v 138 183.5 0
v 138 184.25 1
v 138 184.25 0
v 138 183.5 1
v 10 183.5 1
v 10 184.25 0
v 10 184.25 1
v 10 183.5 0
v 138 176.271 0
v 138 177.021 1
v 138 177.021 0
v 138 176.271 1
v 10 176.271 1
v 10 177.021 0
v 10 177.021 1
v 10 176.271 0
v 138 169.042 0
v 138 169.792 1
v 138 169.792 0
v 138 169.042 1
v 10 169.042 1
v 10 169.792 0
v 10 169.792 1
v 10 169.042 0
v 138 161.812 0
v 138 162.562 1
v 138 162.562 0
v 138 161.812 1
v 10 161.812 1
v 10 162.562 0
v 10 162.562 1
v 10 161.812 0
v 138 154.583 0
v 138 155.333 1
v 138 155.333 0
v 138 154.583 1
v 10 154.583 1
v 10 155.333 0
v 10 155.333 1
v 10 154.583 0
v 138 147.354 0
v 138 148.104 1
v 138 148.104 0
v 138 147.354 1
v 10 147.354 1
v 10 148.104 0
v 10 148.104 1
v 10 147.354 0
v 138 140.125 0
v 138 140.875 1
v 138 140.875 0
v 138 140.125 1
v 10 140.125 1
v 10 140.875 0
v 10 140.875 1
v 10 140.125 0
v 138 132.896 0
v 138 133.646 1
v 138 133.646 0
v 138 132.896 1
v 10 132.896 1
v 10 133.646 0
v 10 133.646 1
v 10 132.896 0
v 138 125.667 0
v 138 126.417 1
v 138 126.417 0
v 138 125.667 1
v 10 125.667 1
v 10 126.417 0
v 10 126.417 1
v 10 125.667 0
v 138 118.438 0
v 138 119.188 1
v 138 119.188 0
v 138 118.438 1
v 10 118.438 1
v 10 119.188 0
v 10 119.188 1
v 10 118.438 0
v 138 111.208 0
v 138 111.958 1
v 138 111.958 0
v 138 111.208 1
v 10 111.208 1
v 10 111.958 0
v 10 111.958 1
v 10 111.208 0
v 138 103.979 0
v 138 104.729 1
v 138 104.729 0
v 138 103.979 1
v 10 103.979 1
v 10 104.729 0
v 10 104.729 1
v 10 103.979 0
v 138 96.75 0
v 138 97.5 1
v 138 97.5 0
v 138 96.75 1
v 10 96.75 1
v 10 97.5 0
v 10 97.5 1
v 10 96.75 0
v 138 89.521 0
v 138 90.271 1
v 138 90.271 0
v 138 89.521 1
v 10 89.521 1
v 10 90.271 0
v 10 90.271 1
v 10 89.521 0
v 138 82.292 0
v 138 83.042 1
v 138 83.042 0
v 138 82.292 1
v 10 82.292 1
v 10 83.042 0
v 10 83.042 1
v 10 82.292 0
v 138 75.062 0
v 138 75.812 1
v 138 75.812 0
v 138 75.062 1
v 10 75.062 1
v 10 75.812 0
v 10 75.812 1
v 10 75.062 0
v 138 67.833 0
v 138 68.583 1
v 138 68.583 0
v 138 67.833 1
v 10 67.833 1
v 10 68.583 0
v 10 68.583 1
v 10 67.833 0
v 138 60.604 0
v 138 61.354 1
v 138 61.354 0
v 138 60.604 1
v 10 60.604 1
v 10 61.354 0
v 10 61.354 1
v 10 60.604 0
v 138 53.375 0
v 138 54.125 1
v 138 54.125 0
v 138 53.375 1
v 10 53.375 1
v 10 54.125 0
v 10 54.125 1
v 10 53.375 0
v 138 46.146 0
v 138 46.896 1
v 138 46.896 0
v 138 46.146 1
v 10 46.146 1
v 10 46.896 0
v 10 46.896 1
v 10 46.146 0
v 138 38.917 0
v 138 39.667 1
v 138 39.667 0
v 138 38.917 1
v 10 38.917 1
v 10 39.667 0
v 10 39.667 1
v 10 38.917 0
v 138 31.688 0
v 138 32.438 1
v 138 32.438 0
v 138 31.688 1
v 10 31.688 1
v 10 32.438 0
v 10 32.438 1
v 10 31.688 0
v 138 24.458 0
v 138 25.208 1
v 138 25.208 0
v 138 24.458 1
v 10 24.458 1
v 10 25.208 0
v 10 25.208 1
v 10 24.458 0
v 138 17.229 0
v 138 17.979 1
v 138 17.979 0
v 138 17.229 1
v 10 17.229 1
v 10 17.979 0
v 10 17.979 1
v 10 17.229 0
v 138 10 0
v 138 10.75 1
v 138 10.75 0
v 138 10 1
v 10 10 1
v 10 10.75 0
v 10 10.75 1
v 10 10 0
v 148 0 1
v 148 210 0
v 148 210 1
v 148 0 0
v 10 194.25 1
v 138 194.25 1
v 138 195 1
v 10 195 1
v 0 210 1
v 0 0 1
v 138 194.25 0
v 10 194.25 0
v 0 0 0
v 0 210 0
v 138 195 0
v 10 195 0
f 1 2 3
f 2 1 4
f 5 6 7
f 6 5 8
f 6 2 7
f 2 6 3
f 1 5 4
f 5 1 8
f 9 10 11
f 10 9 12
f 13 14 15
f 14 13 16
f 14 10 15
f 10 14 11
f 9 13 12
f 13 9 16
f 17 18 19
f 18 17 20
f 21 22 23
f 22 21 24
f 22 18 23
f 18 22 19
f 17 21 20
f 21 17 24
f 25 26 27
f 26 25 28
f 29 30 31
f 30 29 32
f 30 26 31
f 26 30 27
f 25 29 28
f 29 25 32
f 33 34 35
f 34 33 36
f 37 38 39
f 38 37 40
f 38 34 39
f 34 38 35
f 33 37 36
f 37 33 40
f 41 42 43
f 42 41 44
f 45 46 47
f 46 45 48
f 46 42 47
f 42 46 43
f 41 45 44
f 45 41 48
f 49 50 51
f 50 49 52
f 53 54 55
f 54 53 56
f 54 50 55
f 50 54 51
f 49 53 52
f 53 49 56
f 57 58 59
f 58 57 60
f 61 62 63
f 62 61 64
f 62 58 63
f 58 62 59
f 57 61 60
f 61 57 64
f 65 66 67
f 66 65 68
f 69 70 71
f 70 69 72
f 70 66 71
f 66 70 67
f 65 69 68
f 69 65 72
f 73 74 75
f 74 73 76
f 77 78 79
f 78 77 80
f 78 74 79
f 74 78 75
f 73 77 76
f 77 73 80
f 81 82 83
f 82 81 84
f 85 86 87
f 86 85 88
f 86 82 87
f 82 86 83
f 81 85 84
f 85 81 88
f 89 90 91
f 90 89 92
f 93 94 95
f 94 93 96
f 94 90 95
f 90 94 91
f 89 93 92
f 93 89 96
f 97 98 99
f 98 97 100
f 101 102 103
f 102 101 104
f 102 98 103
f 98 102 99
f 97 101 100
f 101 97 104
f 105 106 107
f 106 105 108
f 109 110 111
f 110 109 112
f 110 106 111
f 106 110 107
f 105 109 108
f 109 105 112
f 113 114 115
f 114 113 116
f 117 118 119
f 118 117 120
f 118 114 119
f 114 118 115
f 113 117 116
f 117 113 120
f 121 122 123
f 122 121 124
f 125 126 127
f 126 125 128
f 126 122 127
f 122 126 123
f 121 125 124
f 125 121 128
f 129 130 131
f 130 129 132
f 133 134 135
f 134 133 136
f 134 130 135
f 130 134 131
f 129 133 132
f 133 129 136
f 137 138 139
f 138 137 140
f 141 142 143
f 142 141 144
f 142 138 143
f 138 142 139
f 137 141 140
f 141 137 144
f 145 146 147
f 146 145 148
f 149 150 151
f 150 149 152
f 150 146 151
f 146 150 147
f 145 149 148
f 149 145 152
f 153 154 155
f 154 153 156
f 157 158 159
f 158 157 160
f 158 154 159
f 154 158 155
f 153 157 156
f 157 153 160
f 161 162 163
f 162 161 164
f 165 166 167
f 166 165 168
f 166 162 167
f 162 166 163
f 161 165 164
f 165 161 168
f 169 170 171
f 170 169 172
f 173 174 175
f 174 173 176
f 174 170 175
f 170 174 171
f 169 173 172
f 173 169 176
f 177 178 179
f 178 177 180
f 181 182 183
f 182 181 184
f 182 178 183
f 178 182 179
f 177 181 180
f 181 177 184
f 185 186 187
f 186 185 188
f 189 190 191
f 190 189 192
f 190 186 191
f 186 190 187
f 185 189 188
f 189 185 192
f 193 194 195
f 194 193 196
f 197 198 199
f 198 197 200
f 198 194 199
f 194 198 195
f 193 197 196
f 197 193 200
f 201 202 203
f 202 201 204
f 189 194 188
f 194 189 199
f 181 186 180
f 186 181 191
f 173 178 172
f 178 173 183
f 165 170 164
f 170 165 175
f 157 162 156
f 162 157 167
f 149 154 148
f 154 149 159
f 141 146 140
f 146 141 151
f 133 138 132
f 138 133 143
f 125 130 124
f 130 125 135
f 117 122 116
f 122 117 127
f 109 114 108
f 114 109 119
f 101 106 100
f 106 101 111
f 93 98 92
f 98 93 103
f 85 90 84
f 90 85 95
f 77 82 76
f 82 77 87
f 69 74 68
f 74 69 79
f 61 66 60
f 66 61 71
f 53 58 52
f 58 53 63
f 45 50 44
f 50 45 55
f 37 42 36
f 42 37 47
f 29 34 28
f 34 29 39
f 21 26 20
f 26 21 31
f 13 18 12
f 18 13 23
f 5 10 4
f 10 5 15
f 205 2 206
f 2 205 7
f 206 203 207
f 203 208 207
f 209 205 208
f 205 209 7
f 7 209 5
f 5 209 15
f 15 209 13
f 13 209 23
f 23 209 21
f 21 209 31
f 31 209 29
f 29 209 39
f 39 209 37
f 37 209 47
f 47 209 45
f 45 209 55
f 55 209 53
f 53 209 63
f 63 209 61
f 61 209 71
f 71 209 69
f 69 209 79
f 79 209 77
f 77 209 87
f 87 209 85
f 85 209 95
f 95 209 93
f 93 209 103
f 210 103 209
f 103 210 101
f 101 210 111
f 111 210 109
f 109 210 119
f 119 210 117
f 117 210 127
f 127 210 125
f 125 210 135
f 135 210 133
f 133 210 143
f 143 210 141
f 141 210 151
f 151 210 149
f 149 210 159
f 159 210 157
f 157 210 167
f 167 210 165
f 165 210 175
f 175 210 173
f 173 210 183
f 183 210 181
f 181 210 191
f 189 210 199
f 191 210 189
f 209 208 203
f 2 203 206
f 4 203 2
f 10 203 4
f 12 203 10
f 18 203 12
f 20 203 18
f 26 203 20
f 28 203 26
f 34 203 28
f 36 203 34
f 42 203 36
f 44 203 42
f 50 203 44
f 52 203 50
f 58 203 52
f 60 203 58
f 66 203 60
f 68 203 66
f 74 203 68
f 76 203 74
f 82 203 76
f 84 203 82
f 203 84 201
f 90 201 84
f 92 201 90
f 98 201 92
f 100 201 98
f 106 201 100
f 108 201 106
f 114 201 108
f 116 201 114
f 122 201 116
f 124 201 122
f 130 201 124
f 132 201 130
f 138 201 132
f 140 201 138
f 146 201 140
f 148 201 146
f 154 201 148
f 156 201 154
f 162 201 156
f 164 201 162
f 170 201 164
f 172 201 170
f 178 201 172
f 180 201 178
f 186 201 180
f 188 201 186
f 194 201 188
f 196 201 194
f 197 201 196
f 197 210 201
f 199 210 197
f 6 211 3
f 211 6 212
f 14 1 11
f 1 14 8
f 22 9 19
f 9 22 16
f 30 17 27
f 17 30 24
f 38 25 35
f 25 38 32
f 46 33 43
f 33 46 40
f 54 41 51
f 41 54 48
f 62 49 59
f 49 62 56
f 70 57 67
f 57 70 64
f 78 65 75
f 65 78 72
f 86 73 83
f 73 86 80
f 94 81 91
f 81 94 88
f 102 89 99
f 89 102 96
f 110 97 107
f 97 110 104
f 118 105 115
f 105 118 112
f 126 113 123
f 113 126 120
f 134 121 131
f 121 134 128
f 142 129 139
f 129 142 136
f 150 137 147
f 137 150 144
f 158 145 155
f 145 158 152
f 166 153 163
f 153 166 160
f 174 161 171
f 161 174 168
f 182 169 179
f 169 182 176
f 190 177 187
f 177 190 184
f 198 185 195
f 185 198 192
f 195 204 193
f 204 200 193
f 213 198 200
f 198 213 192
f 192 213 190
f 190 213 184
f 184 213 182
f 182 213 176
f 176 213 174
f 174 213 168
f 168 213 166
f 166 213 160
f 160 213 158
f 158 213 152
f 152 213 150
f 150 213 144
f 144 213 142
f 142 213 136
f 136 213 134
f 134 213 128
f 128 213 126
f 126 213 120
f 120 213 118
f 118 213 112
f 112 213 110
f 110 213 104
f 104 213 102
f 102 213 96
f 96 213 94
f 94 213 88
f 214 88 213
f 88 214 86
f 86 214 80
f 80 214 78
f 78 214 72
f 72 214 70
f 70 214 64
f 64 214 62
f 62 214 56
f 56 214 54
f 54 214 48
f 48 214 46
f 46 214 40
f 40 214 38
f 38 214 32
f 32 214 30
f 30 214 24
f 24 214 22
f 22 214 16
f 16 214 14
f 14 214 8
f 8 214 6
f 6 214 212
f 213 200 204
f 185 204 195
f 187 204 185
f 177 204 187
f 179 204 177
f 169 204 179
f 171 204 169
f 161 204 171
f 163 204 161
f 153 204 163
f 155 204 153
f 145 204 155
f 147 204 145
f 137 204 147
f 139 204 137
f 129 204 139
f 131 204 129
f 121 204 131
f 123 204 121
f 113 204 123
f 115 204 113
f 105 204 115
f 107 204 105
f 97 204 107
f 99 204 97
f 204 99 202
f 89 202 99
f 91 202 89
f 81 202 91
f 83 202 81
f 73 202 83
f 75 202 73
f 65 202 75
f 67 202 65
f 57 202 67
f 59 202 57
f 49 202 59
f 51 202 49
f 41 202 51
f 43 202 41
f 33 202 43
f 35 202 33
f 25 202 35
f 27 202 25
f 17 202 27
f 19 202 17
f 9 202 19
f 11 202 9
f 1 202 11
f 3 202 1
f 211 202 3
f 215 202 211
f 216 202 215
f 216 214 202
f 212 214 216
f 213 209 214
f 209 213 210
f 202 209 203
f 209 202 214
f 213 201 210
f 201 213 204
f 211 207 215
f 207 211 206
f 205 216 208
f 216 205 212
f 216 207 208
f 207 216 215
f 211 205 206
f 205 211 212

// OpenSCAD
// --- Parameters ---
// Overall dimensions of the stencil
// Width [mm]
page_width = 148;
// Height [mm]
page_height = 210;

// Padding from the stencil edges to the line area (margins)
// Space above the title line [mm]
padding_top = 15;
// Space below the last line [mm]
padding_bottom = 10;
// Left margin [mm]
padding_left = 10;
// Right margin [mm]
padding_right = 10;

// Line Configuration
// Number of regular writing lines (excluding the title line)
num_lines = 25;
// Thickness of the slots (determines drawn line height) [mm]
line_thickness = 0.75;
// Extra vertical space below the title line slot [mm]
title_line_gap = 10;

// Stencil physical thickness
// Thickness of the stencil material [mm]
stencil_thickness = 1;


// --- Advanced Parameters ---
// Small overlap for boolean operations to avoid glitches [mm]
subtraction_overlap = 0.1;


// --- Calculations ---
// Calculate the usable width for the line slots
usable_width = page_width - padding_left - padding_right;

// Calculate the total vertical space available for all lines and gaps between them
usable_height = page_height - padding_top - padding_bottom;

// Calculate the Y position for the bottom edge of the title line slot
// Y=0 is at the bottom edge of the stencil
title_line_bottom_y = page_height - padding_top - line_thickness;

// Calculate the Y position for the bottom edge of the first regular line slot
first_regular_line_bottom_y = title_line_bottom_y - title_line_gap - line_thickness;

// Calculate the remaining vertical height available for the regular lines and the gaps between them
// This area starts from the bottom of the first regular line and ends at the top of the bottom padding
regular_lines_area_height = first_regular_line_bottom_y - padding_bottom;

// Calculate the vertical spacing between the bottom edge of one regular line slot
// and the bottom edge of the next regular line slot.
// This distributes the lines evenly within the regular lines area.
// If num_lines is 1, spacing is irrelevant but calculated anyway to avoid division by zero issues later.
line_spacing = (num_lines > 1) ? regular_lines_area_height / (num_lines -1) : regular_lines_area_height;

// Assert calculations validity
assert(usable_width > 0, "Calculated usable_width must be positive. Check paddings.");
assert(usable_height > 0, "Calculated usable_height must be positive. Check paddings.");
assert(regular_lines_area_height >= 0, "Calculated regular_lines_area_height must be non-negative. Check paddings and title_line_gap.");
assert(num_lines >= 0, "Number of lines must be non-negative.");


// --- Module Definition ---
module line_stencil() {
    difference() {
        // Create the base plate of the stencil
        cube([page_width, page_height, stencil_thickness]);

        // Subtract the title line slot
        translate([
            padding_left,
            title_line_bottom_y,
            -subtraction_overlap
        ])
        cube([
            usable_width,
            line_thickness,
            stencil_thickness + 2 * subtraction_overlap
        ]);

        // Subtract the regular line slots
        if (num_lines > 0) {
            for (i = [0 : num_lines - 1]) {
                // Calculate the Y position for the bottom edge of the current regular line
                current_line_bottom_y = first_regular_line_bottom_y - i * line_spacing;

                // Check if the line is within bounds before creating it
                if (current_line_bottom_y >= padding_bottom) {
                    translate([
                        padding_left,
                        current_line_bottom_y,
                        -subtraction_overlap
                    ])
                    cube([
                        usable_width,
                        line_thickness,
                        stencil_thickness + 2 * subtraction_overlap
                    ]);
                }
            }
        }
    }
}

// --- Run ---
line_stencil();
